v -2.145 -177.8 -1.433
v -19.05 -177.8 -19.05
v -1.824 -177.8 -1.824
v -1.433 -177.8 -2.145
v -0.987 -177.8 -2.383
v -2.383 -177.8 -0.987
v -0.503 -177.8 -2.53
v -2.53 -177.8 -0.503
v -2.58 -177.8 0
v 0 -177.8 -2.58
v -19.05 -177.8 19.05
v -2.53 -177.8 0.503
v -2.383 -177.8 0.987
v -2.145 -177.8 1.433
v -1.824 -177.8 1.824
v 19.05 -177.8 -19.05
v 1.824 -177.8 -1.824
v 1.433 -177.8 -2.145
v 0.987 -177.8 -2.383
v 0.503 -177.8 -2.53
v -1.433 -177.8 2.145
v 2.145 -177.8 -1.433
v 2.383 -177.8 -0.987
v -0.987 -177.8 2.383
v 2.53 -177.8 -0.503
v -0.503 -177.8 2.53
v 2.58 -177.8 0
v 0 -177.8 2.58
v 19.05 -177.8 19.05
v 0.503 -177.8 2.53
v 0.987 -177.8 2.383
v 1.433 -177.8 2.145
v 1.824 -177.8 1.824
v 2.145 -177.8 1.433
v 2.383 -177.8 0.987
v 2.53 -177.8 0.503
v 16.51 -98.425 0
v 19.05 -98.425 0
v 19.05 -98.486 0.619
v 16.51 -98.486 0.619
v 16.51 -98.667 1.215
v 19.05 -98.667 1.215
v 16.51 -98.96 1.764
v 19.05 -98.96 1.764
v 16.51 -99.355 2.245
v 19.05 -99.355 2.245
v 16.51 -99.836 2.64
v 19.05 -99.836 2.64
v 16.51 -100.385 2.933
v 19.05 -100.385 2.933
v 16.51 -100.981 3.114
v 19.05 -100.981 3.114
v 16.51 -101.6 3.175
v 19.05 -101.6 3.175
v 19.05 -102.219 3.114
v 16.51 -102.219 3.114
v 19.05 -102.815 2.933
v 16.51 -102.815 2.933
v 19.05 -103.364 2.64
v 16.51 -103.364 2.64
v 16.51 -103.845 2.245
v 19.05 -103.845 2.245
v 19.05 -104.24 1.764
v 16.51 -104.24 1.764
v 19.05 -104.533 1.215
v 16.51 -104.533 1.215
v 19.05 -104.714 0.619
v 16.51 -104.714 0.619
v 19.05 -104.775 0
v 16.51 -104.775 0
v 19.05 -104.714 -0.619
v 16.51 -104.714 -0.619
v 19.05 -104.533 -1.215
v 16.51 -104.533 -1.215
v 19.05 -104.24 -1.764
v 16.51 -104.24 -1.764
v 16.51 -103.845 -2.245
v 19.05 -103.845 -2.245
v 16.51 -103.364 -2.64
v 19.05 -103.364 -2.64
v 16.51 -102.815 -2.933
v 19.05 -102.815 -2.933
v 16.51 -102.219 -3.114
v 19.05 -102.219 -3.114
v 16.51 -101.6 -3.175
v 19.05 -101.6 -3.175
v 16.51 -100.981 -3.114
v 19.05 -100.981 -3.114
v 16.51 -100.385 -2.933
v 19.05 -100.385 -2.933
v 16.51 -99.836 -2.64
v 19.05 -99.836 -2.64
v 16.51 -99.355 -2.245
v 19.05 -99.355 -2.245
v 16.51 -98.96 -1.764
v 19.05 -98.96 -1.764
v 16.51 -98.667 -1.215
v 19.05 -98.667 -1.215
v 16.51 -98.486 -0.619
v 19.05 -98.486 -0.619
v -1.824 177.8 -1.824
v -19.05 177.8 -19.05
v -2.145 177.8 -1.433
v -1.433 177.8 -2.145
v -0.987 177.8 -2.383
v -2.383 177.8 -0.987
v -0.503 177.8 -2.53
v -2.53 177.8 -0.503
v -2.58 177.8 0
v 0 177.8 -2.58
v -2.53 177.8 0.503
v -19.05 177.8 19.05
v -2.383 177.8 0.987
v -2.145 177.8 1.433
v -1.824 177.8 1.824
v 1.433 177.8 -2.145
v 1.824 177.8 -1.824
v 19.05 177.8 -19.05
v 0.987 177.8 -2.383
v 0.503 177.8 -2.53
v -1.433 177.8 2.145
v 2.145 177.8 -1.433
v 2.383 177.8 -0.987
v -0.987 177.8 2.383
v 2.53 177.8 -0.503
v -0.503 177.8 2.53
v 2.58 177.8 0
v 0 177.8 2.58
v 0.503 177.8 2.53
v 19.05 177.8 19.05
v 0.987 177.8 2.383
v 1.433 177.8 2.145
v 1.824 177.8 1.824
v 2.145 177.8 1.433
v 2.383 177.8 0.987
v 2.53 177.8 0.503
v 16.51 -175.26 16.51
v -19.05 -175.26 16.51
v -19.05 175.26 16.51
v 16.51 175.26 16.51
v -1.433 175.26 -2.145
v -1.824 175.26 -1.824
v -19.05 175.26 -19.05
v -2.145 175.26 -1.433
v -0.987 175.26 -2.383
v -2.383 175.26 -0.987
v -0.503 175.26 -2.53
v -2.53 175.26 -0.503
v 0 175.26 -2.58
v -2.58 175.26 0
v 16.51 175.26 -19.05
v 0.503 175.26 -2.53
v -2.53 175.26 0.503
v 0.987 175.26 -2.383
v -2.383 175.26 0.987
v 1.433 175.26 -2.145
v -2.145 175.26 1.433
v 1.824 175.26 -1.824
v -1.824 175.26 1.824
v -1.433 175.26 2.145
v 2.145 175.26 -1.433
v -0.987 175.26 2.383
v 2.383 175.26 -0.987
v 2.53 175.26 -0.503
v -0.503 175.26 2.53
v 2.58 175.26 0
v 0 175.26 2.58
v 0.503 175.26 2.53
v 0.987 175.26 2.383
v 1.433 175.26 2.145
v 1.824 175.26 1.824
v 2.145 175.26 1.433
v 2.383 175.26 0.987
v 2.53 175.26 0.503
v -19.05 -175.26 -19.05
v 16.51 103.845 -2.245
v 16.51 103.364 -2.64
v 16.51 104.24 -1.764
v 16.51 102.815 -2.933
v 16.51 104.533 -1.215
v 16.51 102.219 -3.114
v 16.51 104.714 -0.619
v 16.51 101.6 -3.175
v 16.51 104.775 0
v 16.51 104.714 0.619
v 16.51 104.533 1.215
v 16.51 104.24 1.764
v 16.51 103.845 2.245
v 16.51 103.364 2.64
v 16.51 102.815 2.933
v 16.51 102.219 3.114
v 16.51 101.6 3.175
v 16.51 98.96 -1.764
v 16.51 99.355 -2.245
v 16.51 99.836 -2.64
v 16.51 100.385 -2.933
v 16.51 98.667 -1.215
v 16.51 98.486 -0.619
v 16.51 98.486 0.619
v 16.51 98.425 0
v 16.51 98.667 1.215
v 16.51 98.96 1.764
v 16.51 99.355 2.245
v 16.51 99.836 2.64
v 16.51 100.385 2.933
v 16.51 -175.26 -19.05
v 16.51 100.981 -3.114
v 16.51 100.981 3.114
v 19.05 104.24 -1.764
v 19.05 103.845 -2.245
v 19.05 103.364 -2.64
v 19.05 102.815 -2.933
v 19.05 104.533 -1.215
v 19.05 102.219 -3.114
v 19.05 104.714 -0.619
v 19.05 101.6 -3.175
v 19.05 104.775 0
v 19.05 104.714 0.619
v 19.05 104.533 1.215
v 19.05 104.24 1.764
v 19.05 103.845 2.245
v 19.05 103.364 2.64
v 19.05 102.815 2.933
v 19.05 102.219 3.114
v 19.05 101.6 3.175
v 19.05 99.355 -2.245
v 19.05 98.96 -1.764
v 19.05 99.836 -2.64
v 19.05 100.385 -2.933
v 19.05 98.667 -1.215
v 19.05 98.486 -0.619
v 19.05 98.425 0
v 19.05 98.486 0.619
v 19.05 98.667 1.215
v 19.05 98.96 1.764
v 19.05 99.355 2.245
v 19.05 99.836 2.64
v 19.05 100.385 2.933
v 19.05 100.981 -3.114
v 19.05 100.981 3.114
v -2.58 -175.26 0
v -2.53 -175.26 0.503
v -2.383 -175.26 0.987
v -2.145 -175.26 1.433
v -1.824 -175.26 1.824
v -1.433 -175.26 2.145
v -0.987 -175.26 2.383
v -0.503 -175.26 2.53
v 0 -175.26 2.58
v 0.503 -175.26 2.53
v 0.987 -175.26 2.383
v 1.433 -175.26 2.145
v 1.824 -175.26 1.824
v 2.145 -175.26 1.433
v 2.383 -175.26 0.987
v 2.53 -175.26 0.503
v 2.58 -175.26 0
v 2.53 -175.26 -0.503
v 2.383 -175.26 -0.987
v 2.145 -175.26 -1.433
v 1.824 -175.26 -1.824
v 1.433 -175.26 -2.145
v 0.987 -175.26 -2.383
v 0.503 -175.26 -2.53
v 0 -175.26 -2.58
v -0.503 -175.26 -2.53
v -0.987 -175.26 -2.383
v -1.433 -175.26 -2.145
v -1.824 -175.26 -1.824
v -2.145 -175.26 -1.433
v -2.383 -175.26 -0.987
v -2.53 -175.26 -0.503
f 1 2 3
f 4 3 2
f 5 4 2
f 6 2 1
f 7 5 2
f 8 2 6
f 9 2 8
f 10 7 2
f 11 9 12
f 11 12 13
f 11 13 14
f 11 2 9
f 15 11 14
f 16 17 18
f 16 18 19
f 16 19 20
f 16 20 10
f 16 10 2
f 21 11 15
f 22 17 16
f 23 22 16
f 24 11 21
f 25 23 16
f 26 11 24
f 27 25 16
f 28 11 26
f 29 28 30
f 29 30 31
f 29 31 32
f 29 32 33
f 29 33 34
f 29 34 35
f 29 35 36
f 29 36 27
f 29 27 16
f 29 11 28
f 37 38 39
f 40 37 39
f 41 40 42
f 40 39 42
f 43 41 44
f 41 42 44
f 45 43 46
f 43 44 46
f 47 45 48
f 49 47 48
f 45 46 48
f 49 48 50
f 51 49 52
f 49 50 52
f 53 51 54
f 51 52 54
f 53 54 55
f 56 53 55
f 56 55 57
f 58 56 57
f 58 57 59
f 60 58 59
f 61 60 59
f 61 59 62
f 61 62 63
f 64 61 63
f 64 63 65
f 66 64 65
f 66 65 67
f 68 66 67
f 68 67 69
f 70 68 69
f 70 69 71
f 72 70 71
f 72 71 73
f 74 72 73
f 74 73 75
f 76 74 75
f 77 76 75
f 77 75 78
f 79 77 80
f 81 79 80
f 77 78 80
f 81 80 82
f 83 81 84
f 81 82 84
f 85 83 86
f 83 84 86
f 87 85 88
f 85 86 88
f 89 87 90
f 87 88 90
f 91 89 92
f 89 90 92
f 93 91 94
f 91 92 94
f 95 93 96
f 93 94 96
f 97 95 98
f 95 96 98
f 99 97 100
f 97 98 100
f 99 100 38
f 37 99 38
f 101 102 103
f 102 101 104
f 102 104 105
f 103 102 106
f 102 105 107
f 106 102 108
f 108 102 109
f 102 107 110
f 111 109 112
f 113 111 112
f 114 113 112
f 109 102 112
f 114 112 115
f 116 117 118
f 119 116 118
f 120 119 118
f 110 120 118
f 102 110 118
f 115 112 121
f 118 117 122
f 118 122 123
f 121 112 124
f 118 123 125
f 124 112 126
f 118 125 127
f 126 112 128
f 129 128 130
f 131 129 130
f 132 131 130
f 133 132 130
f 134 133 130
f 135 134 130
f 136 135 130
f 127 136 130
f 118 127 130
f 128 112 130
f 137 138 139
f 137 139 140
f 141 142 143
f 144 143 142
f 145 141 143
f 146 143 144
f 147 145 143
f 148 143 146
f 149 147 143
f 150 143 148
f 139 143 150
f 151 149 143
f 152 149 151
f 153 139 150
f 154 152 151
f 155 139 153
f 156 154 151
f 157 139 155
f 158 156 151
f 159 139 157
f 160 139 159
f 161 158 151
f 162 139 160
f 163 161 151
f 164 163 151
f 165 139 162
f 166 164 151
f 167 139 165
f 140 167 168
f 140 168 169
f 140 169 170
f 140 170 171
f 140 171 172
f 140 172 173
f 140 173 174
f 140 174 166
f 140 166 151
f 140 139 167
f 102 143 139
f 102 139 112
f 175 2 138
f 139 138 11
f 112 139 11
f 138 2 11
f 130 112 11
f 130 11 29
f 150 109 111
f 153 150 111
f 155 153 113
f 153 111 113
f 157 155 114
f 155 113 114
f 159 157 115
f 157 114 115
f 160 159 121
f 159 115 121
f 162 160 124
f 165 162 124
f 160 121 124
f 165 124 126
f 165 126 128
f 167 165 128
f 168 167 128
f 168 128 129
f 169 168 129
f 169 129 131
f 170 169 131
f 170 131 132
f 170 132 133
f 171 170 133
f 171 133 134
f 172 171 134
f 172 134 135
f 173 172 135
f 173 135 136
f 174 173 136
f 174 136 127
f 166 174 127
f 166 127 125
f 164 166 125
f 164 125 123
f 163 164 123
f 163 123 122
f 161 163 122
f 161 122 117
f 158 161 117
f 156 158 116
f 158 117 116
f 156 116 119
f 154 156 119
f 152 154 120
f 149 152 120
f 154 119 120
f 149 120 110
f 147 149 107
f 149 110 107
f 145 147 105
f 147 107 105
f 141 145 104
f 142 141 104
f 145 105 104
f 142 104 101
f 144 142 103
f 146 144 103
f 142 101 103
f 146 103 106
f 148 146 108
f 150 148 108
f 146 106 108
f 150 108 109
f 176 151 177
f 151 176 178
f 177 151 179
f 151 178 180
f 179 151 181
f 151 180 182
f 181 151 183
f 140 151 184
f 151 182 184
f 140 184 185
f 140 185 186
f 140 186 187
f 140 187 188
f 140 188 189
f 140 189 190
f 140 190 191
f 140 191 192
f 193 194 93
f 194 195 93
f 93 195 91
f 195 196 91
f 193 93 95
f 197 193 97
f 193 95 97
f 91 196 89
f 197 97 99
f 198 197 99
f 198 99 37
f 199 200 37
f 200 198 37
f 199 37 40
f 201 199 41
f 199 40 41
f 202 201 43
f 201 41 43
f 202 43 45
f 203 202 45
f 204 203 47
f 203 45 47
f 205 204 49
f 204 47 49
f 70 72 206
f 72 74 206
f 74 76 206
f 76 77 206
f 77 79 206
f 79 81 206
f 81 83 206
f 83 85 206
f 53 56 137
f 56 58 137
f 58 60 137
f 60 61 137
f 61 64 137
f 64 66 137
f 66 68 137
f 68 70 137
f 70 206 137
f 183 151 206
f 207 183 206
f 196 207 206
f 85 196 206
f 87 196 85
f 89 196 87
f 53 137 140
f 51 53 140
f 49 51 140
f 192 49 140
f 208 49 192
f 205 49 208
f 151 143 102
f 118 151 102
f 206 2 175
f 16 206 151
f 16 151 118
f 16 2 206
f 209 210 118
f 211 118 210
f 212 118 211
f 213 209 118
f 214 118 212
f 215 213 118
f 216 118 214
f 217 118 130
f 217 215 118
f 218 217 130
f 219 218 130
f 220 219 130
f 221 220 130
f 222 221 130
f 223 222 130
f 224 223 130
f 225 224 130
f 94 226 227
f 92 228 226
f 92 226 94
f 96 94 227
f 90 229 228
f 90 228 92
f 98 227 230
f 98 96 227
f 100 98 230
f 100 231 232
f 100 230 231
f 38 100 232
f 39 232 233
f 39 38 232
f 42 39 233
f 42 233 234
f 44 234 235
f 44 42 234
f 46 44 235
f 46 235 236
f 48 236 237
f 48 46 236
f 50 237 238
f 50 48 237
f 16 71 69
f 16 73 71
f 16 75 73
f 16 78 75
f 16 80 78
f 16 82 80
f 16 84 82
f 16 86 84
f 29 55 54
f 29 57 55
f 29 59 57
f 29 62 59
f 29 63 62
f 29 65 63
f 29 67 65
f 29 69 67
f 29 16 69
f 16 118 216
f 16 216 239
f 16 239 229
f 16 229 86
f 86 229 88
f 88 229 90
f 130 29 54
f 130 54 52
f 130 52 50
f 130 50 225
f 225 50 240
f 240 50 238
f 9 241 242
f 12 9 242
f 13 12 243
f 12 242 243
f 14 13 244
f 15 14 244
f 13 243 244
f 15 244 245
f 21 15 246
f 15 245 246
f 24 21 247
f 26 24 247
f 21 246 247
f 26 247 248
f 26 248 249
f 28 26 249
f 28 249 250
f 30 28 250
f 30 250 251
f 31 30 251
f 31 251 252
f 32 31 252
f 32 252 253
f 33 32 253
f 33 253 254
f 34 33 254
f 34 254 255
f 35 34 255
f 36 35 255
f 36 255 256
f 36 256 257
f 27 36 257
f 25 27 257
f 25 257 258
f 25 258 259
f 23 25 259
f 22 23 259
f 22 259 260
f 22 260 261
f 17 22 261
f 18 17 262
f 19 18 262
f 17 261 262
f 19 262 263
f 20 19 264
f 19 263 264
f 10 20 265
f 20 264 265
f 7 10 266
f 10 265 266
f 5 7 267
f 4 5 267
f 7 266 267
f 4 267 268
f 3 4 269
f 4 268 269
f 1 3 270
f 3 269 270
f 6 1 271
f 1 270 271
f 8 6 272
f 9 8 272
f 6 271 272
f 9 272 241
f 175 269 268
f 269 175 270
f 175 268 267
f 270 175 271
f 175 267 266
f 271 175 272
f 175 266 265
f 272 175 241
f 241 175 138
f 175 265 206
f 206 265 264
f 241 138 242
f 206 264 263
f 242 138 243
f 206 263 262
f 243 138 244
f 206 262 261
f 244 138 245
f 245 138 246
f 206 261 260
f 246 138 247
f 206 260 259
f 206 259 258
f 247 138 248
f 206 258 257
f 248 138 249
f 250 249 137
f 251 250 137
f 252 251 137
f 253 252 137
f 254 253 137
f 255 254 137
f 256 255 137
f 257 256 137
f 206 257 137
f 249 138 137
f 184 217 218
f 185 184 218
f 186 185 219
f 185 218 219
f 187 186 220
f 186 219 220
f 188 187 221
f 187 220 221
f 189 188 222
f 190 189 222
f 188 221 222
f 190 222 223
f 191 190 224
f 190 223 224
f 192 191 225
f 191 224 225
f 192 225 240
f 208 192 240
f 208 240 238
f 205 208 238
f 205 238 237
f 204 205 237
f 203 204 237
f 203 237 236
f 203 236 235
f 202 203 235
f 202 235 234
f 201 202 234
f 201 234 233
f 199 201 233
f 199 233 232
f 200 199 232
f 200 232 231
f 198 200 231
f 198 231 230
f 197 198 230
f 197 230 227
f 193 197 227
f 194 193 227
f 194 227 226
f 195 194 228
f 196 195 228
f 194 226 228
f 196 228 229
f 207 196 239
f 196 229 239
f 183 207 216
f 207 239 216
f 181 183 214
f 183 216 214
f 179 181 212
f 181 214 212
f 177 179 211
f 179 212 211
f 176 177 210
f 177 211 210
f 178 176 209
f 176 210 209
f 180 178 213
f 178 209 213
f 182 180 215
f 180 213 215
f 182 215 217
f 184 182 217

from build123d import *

# Parameters (mm, degrees)
F0_W     = 38.1
F0_H     = 38.1
F1_DEPTH = 177.8
F2_T     = -2.54
F3_R     = 2.579688
F4_DEPTH = 355.601
F5_R     = 3.175
F6_DEPTH = 38.101


with BuildPart() as f1:
    # F0 (on Front) → F1 (new body, symmetric)
    with BuildSketch(Plane.XZ):
        Rectangle(F0_W, F0_H)
    extrude(amount=F1_DEPTH, both=True)

    # F2
    f2_openings = [f1.faces().sort_by_distance(p)[0] for p in [
        (-19.05, 0, 0),
        (0, 0, -19.05),
    ]]
    offset(amount=F2_T, openings=f2_openings)

    # F3 (on face) → F4 (cut, through all)
    with BuildSketch(Plane(origin=(0, 177.8, 0), x_dir=(-1, 0, 0), z_dir=(0, 1, 0))):
        Circle(F3_R)
    extrude(amount=-F4_DEPTH, mode=Mode.SUBTRACT)

    # F5 (on face) → F6 (cut, through all)
    with BuildSketch(Plane.YZ.offset(19.05)):
        with Locations((-101.6, 0)):
            Circle(F5_R)
        with Locations((101.6, 0)):
            Circle(F5_R)
    extrude(amount=-F6_DEPTH, mode=Mode.SUBTRACT)


solid = f1.part
